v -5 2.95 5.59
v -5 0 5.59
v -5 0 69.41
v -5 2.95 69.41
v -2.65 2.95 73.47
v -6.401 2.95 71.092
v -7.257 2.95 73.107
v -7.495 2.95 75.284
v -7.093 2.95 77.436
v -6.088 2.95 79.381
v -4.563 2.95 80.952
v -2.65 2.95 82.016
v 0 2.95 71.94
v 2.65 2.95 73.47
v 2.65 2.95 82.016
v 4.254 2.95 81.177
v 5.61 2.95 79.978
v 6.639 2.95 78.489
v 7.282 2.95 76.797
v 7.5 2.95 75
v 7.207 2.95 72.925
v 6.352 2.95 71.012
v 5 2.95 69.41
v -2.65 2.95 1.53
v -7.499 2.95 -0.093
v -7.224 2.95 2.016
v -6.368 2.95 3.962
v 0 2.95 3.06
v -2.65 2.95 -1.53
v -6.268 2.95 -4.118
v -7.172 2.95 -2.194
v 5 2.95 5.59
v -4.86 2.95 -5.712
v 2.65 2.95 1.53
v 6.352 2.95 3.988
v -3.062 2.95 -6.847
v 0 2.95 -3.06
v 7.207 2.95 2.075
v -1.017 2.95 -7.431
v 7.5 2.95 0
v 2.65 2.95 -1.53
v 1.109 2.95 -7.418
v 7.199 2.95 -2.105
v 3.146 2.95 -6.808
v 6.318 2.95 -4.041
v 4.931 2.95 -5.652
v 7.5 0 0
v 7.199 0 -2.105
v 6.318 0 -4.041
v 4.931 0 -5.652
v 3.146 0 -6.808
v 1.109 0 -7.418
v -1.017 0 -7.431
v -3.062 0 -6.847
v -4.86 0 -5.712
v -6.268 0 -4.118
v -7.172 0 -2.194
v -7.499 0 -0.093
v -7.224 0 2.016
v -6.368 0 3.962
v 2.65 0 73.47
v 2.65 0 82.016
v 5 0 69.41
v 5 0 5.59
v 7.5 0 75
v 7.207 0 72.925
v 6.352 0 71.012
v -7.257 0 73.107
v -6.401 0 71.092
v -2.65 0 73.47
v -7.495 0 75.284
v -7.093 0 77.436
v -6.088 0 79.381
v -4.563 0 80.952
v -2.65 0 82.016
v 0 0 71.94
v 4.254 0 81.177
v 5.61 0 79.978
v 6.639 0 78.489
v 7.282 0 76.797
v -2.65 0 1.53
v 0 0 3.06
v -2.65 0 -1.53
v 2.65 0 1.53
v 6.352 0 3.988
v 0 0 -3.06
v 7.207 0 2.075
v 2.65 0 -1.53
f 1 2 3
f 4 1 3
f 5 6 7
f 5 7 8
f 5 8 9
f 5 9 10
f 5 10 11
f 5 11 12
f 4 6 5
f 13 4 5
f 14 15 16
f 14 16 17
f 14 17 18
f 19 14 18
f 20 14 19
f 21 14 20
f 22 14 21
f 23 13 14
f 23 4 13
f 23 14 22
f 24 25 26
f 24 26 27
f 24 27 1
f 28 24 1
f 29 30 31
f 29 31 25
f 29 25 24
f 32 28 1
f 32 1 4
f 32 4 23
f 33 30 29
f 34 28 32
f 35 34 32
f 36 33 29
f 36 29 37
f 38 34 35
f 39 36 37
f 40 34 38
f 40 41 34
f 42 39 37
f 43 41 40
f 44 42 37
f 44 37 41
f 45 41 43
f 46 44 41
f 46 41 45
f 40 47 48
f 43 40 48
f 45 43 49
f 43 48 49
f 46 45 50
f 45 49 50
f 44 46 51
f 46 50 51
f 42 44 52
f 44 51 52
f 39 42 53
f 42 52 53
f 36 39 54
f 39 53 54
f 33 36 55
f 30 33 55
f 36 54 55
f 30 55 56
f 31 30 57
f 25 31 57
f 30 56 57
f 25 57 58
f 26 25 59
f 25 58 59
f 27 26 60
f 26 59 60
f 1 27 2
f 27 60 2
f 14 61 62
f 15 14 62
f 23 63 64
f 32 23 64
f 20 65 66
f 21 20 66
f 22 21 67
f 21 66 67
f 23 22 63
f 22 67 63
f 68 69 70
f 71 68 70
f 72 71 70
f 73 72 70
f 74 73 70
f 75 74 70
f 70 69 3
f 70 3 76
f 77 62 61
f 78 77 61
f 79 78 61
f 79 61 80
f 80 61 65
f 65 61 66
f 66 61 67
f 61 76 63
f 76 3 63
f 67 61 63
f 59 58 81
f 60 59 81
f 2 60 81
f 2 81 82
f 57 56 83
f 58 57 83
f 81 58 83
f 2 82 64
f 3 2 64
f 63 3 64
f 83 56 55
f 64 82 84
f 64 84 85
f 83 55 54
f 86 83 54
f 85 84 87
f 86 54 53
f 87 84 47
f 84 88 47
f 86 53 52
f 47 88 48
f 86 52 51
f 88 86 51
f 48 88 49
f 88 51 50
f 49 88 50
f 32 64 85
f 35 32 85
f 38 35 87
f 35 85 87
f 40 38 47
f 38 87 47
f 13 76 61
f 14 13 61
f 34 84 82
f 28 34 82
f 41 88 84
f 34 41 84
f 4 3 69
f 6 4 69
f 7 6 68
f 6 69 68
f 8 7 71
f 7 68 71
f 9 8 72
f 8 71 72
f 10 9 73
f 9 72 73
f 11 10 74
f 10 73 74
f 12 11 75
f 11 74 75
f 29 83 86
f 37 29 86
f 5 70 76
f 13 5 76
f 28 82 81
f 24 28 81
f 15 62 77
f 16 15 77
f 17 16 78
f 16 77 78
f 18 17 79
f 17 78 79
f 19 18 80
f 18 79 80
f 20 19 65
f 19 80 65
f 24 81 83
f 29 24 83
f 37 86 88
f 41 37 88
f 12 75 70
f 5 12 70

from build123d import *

# Parameters (mm, degrees)
BOSS_EXTRUDE1_DEPTH = 2.95


with BuildPart() as part:
    # Sketch1 → Boss-Extrude1 (new body)
    with BuildSketch(Plane(origin=(0, 0, 0), x_dir=(1, 0, 0), z_dir=(0, 1, 0))):
        with BuildLine():
            Line((5, -75), (5, -69.409830056))
            ThreePointArc((5, -69.409830056), (0, -67.5), (-5, -69.409830056))
            Line((-5, -69.409830056), (-5, -75))
            Line((-5, -75), (-2.65, -75))
            Line((-2.65, -75), (-2.65, -73.470021787))
            Line((-2.65, -73.470021787), (0, -71.940043573))
            Line((0, -71.940043573), (2.65, -73.470021787))
            Line((2.65, -73.470021787), (2.65, -75))
            Line((2.65, -75), (5, -75))
        make_face()
        with BuildLine():
            Line((-5, -75), (-5, -69.409830056))
            ThreePointArc((-5, -69.409830056), (-7.372988698, -76.374422666), (-2.65, -82.016231182))
            Line((-2.65, -82.016231182), (-2.65, -76.529978213))
            Line((-2.65, -76.529978213), (-2.65, -75))
            Line((-2.65, -75), (-5, -75))
        make_face()
        with BuildLine():
            ThreePointArc((7.5, -75), (6.846531969, -71.938137822), (5, -69.409830056))
            Line((5, -69.409830056), (5, -75))
            Line((5, -75), (2.65, -75))
            Line((2.65, -75), (2.65, -76.529978213))
            Line((2.65, -76.529978213), (2.65, -82.016231182))
            ThreePointArc((2.65, -82.016231182), (6.16948134, -79.264680527), (7.5, -75))
        make_face()
        with BuildLine():
            Line((5, -69.409830056), (5, -5.590169944))
            ThreePointArc((5, -5.590169944), (0, -7.5), (-5, -5.590169944))
            Line((-5, -5.590169944), (-5, -69.409830056))
            ThreePointArc((-5, -69.409830056), (0, -67.5), (5, -69.409830056))
        make_face()
        with BuildLine():
            Line((2.65, 1.529978213), (2.65, 0))
            Line((2.65, 0), (5, 0))
            Line((5, 0), (5, -5.590169944))
            ThreePointArc((5, -5.590169944), (6.846531969, -3.061862178), (7.5, 0))
            ThreePointArc((7.5, 0), (-3.061862178, 6.846531969), (-5, -5.590169944))
            Line((-5, -5.590169944), (-5, 0))
            Line((-5, 0), (-2.65, 0))
            Line((-2.65, 0), (-2.65, 1.529978213))
            Line((-2.65, 1.529978213), (0, 3.059956427))
            Line((0, 3.059956427), (2.65, 1.529978213))
        make_face()
        with BuildLine():
            Line((2.65, -1.529978213), (0, -3.059956427))
            Line((0, -3.059956427), (-2.65, -1.529978213))
            Line((-2.65, -1.529978213), (-2.65, 0))
            Line((-2.65, 0), (-5, 0))
            Line((-5, 0), (-5, -5.590169944))
            ThreePointArc((-5, -5.590169944), (0, -7.5), (5, -5.590169944))
            Line((5, -5.590169944), (5, 0))
            Line((5, 0), (2.65, 0))
            Line((2.65, 0), (2.65, -1.529978213))
        make_face()
    extrude(amount=BOSS_EXTRUDE1_DEPTH)


solid = part.part
